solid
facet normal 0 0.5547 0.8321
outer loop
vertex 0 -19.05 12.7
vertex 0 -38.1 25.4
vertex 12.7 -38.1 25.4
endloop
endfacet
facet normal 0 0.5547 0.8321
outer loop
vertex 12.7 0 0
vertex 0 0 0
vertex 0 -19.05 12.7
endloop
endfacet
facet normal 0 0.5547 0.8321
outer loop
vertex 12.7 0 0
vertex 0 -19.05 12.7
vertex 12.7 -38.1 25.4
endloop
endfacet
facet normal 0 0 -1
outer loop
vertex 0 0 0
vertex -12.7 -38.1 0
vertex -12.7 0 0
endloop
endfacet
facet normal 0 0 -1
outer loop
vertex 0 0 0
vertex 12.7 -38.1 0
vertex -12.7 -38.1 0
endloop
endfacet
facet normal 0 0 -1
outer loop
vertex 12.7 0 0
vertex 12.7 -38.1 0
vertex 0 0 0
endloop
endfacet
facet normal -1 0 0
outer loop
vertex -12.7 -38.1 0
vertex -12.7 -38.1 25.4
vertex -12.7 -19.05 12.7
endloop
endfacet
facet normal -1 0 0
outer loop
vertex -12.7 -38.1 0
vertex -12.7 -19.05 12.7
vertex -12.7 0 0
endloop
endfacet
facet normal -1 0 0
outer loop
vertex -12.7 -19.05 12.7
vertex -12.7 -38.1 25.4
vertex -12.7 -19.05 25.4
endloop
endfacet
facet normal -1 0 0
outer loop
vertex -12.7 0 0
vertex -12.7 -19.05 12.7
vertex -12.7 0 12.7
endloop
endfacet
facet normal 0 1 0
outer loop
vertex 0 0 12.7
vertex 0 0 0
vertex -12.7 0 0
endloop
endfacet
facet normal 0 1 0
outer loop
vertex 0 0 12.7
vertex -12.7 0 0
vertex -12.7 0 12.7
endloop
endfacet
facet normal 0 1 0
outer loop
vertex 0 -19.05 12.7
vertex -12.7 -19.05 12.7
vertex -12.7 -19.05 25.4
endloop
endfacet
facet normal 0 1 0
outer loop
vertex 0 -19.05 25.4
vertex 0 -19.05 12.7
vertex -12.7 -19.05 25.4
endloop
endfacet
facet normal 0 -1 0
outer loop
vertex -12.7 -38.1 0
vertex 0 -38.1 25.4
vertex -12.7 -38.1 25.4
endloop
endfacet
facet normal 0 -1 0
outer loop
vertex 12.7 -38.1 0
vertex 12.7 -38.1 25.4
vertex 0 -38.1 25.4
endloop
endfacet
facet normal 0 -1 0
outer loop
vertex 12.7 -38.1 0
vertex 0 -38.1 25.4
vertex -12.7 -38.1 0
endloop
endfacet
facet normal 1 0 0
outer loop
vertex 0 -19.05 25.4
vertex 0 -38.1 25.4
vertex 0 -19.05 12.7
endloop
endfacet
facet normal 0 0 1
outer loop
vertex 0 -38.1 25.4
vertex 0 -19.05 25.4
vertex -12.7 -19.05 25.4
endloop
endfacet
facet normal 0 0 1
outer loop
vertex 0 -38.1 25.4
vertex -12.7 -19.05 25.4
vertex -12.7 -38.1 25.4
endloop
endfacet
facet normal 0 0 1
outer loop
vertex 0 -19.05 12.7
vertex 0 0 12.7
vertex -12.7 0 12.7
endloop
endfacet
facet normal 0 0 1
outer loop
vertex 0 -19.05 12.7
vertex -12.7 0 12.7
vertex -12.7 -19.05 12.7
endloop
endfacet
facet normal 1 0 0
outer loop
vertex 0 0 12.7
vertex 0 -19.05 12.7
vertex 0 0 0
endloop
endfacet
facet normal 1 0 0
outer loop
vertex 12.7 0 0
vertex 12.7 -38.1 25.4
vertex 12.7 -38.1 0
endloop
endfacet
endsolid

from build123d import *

# Parameters (mm, degrees)
F0_W     = 38.1
F0_H     = 25.4
F1_DEPTH = 12.7
F2_SIZE2 = 25.39999
F2_SIZE  = 38.09999
F4_DEPTH = 12.7


# Not quite as in the source:
# - a fillet or chamfer is up to 0.001 mm smaller than in the source, because OpenCascade refuses the exact size


with BuildPart() as f1:
    # F0 (on Right) → F1 (new body)
    with BuildSketch(Plane.YZ):
        with Locations((-19.05, 12.7)):
            Rectangle(F0_W, F0_H)
    extrude(amount=F1_DEPTH)

    # F2 (size 38.1 and 25.4 in the source; OpenCascade refuses exactly that, so slightly less here)
    f2_edges = [f1.edges().sort_by_distance(p)[0] for p in [
        (6.35, 0, 25.4),
    ]]
    f2_side = f1.faces().sort_by_distance((6.35, -19.05, 25.4))[0]
    chamfer(f2_edges, length=F2_SIZE, length2=F2_SIZE2, reference=f2_side)

    # F3 (on Right) → F4 (join)
    with BuildSketch(Plane.YZ):
        Polygon((-38.1, 0), (0, 0), (0, 12.7), (-19.05, 12.7), (-19.05, 25.4), (-38.1, 25.4), align=None)
    extrude(amount=-F4_DEPTH)


solid = f1.part
